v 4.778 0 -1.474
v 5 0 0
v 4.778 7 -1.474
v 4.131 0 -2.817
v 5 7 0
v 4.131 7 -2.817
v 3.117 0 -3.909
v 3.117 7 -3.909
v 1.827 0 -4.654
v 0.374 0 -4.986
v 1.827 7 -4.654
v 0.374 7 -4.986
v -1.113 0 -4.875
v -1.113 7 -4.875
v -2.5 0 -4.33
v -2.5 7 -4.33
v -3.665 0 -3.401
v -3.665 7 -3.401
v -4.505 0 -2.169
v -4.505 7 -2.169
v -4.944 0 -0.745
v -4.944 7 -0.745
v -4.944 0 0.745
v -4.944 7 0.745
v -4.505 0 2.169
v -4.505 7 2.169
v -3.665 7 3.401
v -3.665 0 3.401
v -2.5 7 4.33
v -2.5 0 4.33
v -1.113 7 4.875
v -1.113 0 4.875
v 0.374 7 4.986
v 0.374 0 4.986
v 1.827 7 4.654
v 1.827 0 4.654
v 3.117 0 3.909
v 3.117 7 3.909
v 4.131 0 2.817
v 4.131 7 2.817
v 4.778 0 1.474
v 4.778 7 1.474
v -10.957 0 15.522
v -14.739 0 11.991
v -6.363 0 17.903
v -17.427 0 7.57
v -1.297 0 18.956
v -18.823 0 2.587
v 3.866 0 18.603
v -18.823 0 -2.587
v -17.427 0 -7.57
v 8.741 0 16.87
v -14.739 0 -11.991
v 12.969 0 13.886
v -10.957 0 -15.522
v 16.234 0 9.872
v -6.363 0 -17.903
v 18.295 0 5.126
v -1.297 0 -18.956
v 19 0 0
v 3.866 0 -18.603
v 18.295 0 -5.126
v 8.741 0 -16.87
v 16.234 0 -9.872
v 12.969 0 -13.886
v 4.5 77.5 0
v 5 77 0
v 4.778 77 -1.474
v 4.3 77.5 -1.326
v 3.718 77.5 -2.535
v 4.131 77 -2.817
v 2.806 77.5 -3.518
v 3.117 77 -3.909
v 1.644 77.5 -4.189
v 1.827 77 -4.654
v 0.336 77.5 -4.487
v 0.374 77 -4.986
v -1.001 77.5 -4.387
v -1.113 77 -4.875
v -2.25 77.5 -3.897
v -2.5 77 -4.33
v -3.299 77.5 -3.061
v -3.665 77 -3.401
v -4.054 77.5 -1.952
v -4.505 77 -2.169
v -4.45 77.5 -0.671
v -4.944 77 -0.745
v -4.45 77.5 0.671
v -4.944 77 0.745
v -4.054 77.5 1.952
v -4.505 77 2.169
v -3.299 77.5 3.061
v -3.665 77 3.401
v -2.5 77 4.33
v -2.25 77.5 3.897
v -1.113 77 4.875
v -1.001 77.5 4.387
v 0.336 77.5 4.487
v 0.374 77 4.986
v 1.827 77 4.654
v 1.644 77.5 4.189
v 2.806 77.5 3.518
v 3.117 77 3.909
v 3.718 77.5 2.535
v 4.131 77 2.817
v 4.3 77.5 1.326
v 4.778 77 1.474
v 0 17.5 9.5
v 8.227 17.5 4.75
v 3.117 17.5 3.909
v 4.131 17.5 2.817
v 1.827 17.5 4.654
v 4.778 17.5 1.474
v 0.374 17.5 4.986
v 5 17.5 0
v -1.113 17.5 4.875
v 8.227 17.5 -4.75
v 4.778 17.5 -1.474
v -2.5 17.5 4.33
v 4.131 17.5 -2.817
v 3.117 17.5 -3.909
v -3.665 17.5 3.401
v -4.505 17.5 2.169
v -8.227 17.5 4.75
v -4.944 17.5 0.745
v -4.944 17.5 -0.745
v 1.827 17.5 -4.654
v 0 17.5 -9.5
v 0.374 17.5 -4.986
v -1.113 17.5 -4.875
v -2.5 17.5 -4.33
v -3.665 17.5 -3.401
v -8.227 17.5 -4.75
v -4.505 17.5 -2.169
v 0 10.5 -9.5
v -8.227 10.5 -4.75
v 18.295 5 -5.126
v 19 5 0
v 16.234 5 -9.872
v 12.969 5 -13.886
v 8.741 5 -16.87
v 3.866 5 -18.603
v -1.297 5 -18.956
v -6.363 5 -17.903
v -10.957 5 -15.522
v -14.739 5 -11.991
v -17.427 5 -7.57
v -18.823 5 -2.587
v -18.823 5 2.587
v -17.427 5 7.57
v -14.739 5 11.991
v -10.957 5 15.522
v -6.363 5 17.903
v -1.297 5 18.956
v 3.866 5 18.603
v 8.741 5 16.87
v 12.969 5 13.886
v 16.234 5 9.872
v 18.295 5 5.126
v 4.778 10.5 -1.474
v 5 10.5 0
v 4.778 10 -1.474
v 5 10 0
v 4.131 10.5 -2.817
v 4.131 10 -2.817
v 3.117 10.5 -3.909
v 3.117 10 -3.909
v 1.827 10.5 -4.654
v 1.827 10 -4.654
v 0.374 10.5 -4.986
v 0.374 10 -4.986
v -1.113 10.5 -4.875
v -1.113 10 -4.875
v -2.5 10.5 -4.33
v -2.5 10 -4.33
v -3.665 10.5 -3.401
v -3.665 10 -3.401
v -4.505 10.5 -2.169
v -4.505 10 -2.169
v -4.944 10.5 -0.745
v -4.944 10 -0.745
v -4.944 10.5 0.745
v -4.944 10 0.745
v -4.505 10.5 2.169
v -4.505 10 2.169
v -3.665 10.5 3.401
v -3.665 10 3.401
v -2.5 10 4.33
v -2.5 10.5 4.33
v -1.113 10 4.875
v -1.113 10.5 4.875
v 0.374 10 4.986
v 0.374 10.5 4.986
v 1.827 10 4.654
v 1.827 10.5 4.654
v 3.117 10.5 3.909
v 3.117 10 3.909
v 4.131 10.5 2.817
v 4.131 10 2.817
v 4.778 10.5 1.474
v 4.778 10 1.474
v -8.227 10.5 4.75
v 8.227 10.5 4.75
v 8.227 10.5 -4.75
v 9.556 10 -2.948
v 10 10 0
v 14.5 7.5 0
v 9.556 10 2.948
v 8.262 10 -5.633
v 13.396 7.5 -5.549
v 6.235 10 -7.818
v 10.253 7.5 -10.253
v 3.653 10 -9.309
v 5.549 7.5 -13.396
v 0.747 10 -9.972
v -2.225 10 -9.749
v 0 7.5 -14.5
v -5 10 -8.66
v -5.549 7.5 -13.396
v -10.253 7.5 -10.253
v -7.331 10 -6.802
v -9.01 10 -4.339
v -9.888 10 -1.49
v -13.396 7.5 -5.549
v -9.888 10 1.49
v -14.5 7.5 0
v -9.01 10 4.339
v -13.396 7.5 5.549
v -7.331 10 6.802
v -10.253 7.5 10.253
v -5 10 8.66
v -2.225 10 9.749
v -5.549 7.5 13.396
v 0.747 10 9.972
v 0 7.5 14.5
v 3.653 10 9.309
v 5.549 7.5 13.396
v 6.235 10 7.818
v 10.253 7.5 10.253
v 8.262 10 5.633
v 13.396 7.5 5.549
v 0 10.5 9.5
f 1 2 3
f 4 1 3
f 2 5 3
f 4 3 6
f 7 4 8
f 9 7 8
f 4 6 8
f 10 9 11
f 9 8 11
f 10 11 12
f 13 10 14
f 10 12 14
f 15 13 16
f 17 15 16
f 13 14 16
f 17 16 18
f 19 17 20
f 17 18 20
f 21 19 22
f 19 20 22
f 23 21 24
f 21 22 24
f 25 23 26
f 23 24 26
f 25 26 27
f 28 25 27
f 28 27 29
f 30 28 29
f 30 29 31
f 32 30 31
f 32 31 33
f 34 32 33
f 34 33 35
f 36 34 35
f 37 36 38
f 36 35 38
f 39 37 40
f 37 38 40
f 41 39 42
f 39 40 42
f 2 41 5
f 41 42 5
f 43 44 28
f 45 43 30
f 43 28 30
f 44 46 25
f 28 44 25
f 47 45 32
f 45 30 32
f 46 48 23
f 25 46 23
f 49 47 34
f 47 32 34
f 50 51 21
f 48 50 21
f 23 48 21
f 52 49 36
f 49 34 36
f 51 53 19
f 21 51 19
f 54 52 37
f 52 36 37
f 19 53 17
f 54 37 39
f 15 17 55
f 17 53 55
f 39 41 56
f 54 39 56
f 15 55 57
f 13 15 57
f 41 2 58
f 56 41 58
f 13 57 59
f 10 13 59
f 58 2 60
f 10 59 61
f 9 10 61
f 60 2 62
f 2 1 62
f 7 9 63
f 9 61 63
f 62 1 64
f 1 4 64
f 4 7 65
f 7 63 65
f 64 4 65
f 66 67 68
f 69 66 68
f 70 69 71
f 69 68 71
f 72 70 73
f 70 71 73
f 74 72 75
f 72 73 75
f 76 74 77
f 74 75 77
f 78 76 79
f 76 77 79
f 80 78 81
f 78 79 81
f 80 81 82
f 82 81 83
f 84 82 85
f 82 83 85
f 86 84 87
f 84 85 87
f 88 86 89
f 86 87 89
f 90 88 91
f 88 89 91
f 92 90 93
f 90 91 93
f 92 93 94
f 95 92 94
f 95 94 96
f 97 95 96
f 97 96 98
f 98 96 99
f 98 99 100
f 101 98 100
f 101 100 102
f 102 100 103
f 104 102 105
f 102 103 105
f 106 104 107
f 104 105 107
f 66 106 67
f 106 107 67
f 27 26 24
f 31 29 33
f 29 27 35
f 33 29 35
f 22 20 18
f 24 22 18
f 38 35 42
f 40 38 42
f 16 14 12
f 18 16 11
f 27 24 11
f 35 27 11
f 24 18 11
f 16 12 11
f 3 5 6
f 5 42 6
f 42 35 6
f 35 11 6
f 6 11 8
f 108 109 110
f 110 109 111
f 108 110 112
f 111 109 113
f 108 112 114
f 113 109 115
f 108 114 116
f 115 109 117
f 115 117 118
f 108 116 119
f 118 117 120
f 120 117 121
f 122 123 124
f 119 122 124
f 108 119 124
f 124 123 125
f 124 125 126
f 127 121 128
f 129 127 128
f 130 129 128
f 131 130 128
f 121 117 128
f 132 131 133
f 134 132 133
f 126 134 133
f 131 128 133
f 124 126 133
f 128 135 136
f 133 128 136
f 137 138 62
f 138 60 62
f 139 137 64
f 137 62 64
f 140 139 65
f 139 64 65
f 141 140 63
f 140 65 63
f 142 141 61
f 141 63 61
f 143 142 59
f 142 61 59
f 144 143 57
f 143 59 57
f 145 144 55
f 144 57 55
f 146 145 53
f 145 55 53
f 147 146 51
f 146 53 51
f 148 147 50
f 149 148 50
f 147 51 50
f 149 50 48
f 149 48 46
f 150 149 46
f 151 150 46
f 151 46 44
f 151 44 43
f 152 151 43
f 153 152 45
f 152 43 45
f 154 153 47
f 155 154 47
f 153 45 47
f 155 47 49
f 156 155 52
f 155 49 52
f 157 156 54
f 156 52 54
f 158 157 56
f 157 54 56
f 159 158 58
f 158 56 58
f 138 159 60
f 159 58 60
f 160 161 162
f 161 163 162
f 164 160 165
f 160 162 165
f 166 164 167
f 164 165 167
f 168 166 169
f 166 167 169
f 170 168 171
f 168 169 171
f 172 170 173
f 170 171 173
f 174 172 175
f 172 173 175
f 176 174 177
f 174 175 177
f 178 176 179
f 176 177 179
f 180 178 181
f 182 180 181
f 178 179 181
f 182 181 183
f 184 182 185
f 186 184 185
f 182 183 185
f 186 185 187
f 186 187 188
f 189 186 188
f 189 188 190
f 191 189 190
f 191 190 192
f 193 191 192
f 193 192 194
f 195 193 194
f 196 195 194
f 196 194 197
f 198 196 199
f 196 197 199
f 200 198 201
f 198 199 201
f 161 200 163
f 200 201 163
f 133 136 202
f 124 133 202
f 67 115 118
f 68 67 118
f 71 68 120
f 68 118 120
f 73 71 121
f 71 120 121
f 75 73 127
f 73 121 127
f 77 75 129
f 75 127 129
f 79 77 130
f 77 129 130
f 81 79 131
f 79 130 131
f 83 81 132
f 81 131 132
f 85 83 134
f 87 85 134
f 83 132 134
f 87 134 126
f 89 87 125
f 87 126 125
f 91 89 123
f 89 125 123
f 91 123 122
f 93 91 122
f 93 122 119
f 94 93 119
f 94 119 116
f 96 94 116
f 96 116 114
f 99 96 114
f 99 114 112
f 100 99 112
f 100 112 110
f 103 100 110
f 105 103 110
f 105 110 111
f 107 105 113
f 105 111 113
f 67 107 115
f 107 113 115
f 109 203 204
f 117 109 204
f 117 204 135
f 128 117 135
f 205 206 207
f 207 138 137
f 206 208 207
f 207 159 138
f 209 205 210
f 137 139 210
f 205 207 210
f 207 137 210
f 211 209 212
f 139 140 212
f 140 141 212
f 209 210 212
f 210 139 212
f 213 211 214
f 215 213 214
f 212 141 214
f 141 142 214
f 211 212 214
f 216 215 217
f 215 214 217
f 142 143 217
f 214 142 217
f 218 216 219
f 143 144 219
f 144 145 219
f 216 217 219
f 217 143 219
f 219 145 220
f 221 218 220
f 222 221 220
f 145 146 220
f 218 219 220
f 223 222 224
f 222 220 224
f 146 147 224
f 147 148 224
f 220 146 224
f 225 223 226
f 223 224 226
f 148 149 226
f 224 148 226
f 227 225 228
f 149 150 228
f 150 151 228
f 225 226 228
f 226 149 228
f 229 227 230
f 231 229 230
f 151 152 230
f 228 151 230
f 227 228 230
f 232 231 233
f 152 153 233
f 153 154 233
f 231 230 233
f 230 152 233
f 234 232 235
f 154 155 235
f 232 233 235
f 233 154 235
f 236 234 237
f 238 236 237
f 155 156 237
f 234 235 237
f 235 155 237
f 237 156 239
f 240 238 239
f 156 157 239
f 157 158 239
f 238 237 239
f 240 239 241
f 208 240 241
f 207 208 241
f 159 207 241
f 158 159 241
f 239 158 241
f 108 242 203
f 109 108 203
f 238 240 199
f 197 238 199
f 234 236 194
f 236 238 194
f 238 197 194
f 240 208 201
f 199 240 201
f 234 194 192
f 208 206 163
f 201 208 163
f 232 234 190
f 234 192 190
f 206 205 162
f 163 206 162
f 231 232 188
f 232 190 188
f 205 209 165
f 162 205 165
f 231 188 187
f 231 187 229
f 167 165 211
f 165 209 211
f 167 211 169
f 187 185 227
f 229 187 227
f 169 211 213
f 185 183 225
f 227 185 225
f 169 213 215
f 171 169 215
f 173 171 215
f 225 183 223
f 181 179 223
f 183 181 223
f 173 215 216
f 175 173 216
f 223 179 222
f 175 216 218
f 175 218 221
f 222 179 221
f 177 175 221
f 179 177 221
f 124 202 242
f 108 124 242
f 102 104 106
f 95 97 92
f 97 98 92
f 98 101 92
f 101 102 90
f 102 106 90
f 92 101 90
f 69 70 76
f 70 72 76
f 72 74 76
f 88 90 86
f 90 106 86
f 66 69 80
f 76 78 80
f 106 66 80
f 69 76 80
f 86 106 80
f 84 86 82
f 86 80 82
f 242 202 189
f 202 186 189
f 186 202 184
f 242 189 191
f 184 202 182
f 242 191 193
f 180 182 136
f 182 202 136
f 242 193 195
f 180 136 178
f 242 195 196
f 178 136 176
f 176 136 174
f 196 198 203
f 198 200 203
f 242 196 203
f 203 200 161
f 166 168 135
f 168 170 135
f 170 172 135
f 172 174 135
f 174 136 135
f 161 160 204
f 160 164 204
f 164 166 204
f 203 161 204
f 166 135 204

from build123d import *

# Parameters (mm, degrees)
CHAMFER_1_SIZE      = 0.5
CUT_EXTRUDE_START   = -7
SKETCH_2_R          = 12.139773641
CUT_EXTRUDE_1_DEPTH = 7


with BuildPart() as part:
    # Эскиз1 → Повернуть1 (revolve)
    with BuildSketch(Plane.XY, mode=Mode.PRIVATE) as revolve_1_sk:
        Polygon((0, 77.5), (-5, 77.5), (-5, 17.5), (-9.5, 17.5), (-9.5, 10.5), (-5, 10.5), (-5, 10), (-10, 10), (-19, 5), (-19, 0), (-5, 0), (-5, 7), (0, 7), align=None)
    revolve(revolve_1_sk.sketch.rotate(Axis((0, 0, 0), (0, 1, 0)), 180), axis=Axis((0, 0, 0), (0, 1, 0)))  # turned: the seam where the file's is

    # Фаска1
    chamfer_1_edges = [part.edges().sort_by_distance(p)[0] for p in [
        (-5, 77.5, 0),
    ]]
    chamfer(chamfer_1_edges, length=CHAMFER_1_SIZE)

    # Эскиз2 → Вырез-Вытянуть1 (cut)
    with BuildSketch(Plane(origin=(0, 17.5, 0), x_dir=(1, 0, 0), z_dir=(0, 1, 0)).offset(CUT_EXTRUDE_START)):
        Circle(SKETCH_2_R)
        Polygon((0, 9.5), (-8.227241336, 4.75), (-8.227241336, -4.75), (0, -9.5), (8.227241336, -4.75), (8.227241336, 4.75), align=None, mode=Mode.SUBTRACT)
    extrude(amount=CUT_EXTRUDE_1_DEPTH, mode=Mode.SUBTRACT)


solid = part.part
